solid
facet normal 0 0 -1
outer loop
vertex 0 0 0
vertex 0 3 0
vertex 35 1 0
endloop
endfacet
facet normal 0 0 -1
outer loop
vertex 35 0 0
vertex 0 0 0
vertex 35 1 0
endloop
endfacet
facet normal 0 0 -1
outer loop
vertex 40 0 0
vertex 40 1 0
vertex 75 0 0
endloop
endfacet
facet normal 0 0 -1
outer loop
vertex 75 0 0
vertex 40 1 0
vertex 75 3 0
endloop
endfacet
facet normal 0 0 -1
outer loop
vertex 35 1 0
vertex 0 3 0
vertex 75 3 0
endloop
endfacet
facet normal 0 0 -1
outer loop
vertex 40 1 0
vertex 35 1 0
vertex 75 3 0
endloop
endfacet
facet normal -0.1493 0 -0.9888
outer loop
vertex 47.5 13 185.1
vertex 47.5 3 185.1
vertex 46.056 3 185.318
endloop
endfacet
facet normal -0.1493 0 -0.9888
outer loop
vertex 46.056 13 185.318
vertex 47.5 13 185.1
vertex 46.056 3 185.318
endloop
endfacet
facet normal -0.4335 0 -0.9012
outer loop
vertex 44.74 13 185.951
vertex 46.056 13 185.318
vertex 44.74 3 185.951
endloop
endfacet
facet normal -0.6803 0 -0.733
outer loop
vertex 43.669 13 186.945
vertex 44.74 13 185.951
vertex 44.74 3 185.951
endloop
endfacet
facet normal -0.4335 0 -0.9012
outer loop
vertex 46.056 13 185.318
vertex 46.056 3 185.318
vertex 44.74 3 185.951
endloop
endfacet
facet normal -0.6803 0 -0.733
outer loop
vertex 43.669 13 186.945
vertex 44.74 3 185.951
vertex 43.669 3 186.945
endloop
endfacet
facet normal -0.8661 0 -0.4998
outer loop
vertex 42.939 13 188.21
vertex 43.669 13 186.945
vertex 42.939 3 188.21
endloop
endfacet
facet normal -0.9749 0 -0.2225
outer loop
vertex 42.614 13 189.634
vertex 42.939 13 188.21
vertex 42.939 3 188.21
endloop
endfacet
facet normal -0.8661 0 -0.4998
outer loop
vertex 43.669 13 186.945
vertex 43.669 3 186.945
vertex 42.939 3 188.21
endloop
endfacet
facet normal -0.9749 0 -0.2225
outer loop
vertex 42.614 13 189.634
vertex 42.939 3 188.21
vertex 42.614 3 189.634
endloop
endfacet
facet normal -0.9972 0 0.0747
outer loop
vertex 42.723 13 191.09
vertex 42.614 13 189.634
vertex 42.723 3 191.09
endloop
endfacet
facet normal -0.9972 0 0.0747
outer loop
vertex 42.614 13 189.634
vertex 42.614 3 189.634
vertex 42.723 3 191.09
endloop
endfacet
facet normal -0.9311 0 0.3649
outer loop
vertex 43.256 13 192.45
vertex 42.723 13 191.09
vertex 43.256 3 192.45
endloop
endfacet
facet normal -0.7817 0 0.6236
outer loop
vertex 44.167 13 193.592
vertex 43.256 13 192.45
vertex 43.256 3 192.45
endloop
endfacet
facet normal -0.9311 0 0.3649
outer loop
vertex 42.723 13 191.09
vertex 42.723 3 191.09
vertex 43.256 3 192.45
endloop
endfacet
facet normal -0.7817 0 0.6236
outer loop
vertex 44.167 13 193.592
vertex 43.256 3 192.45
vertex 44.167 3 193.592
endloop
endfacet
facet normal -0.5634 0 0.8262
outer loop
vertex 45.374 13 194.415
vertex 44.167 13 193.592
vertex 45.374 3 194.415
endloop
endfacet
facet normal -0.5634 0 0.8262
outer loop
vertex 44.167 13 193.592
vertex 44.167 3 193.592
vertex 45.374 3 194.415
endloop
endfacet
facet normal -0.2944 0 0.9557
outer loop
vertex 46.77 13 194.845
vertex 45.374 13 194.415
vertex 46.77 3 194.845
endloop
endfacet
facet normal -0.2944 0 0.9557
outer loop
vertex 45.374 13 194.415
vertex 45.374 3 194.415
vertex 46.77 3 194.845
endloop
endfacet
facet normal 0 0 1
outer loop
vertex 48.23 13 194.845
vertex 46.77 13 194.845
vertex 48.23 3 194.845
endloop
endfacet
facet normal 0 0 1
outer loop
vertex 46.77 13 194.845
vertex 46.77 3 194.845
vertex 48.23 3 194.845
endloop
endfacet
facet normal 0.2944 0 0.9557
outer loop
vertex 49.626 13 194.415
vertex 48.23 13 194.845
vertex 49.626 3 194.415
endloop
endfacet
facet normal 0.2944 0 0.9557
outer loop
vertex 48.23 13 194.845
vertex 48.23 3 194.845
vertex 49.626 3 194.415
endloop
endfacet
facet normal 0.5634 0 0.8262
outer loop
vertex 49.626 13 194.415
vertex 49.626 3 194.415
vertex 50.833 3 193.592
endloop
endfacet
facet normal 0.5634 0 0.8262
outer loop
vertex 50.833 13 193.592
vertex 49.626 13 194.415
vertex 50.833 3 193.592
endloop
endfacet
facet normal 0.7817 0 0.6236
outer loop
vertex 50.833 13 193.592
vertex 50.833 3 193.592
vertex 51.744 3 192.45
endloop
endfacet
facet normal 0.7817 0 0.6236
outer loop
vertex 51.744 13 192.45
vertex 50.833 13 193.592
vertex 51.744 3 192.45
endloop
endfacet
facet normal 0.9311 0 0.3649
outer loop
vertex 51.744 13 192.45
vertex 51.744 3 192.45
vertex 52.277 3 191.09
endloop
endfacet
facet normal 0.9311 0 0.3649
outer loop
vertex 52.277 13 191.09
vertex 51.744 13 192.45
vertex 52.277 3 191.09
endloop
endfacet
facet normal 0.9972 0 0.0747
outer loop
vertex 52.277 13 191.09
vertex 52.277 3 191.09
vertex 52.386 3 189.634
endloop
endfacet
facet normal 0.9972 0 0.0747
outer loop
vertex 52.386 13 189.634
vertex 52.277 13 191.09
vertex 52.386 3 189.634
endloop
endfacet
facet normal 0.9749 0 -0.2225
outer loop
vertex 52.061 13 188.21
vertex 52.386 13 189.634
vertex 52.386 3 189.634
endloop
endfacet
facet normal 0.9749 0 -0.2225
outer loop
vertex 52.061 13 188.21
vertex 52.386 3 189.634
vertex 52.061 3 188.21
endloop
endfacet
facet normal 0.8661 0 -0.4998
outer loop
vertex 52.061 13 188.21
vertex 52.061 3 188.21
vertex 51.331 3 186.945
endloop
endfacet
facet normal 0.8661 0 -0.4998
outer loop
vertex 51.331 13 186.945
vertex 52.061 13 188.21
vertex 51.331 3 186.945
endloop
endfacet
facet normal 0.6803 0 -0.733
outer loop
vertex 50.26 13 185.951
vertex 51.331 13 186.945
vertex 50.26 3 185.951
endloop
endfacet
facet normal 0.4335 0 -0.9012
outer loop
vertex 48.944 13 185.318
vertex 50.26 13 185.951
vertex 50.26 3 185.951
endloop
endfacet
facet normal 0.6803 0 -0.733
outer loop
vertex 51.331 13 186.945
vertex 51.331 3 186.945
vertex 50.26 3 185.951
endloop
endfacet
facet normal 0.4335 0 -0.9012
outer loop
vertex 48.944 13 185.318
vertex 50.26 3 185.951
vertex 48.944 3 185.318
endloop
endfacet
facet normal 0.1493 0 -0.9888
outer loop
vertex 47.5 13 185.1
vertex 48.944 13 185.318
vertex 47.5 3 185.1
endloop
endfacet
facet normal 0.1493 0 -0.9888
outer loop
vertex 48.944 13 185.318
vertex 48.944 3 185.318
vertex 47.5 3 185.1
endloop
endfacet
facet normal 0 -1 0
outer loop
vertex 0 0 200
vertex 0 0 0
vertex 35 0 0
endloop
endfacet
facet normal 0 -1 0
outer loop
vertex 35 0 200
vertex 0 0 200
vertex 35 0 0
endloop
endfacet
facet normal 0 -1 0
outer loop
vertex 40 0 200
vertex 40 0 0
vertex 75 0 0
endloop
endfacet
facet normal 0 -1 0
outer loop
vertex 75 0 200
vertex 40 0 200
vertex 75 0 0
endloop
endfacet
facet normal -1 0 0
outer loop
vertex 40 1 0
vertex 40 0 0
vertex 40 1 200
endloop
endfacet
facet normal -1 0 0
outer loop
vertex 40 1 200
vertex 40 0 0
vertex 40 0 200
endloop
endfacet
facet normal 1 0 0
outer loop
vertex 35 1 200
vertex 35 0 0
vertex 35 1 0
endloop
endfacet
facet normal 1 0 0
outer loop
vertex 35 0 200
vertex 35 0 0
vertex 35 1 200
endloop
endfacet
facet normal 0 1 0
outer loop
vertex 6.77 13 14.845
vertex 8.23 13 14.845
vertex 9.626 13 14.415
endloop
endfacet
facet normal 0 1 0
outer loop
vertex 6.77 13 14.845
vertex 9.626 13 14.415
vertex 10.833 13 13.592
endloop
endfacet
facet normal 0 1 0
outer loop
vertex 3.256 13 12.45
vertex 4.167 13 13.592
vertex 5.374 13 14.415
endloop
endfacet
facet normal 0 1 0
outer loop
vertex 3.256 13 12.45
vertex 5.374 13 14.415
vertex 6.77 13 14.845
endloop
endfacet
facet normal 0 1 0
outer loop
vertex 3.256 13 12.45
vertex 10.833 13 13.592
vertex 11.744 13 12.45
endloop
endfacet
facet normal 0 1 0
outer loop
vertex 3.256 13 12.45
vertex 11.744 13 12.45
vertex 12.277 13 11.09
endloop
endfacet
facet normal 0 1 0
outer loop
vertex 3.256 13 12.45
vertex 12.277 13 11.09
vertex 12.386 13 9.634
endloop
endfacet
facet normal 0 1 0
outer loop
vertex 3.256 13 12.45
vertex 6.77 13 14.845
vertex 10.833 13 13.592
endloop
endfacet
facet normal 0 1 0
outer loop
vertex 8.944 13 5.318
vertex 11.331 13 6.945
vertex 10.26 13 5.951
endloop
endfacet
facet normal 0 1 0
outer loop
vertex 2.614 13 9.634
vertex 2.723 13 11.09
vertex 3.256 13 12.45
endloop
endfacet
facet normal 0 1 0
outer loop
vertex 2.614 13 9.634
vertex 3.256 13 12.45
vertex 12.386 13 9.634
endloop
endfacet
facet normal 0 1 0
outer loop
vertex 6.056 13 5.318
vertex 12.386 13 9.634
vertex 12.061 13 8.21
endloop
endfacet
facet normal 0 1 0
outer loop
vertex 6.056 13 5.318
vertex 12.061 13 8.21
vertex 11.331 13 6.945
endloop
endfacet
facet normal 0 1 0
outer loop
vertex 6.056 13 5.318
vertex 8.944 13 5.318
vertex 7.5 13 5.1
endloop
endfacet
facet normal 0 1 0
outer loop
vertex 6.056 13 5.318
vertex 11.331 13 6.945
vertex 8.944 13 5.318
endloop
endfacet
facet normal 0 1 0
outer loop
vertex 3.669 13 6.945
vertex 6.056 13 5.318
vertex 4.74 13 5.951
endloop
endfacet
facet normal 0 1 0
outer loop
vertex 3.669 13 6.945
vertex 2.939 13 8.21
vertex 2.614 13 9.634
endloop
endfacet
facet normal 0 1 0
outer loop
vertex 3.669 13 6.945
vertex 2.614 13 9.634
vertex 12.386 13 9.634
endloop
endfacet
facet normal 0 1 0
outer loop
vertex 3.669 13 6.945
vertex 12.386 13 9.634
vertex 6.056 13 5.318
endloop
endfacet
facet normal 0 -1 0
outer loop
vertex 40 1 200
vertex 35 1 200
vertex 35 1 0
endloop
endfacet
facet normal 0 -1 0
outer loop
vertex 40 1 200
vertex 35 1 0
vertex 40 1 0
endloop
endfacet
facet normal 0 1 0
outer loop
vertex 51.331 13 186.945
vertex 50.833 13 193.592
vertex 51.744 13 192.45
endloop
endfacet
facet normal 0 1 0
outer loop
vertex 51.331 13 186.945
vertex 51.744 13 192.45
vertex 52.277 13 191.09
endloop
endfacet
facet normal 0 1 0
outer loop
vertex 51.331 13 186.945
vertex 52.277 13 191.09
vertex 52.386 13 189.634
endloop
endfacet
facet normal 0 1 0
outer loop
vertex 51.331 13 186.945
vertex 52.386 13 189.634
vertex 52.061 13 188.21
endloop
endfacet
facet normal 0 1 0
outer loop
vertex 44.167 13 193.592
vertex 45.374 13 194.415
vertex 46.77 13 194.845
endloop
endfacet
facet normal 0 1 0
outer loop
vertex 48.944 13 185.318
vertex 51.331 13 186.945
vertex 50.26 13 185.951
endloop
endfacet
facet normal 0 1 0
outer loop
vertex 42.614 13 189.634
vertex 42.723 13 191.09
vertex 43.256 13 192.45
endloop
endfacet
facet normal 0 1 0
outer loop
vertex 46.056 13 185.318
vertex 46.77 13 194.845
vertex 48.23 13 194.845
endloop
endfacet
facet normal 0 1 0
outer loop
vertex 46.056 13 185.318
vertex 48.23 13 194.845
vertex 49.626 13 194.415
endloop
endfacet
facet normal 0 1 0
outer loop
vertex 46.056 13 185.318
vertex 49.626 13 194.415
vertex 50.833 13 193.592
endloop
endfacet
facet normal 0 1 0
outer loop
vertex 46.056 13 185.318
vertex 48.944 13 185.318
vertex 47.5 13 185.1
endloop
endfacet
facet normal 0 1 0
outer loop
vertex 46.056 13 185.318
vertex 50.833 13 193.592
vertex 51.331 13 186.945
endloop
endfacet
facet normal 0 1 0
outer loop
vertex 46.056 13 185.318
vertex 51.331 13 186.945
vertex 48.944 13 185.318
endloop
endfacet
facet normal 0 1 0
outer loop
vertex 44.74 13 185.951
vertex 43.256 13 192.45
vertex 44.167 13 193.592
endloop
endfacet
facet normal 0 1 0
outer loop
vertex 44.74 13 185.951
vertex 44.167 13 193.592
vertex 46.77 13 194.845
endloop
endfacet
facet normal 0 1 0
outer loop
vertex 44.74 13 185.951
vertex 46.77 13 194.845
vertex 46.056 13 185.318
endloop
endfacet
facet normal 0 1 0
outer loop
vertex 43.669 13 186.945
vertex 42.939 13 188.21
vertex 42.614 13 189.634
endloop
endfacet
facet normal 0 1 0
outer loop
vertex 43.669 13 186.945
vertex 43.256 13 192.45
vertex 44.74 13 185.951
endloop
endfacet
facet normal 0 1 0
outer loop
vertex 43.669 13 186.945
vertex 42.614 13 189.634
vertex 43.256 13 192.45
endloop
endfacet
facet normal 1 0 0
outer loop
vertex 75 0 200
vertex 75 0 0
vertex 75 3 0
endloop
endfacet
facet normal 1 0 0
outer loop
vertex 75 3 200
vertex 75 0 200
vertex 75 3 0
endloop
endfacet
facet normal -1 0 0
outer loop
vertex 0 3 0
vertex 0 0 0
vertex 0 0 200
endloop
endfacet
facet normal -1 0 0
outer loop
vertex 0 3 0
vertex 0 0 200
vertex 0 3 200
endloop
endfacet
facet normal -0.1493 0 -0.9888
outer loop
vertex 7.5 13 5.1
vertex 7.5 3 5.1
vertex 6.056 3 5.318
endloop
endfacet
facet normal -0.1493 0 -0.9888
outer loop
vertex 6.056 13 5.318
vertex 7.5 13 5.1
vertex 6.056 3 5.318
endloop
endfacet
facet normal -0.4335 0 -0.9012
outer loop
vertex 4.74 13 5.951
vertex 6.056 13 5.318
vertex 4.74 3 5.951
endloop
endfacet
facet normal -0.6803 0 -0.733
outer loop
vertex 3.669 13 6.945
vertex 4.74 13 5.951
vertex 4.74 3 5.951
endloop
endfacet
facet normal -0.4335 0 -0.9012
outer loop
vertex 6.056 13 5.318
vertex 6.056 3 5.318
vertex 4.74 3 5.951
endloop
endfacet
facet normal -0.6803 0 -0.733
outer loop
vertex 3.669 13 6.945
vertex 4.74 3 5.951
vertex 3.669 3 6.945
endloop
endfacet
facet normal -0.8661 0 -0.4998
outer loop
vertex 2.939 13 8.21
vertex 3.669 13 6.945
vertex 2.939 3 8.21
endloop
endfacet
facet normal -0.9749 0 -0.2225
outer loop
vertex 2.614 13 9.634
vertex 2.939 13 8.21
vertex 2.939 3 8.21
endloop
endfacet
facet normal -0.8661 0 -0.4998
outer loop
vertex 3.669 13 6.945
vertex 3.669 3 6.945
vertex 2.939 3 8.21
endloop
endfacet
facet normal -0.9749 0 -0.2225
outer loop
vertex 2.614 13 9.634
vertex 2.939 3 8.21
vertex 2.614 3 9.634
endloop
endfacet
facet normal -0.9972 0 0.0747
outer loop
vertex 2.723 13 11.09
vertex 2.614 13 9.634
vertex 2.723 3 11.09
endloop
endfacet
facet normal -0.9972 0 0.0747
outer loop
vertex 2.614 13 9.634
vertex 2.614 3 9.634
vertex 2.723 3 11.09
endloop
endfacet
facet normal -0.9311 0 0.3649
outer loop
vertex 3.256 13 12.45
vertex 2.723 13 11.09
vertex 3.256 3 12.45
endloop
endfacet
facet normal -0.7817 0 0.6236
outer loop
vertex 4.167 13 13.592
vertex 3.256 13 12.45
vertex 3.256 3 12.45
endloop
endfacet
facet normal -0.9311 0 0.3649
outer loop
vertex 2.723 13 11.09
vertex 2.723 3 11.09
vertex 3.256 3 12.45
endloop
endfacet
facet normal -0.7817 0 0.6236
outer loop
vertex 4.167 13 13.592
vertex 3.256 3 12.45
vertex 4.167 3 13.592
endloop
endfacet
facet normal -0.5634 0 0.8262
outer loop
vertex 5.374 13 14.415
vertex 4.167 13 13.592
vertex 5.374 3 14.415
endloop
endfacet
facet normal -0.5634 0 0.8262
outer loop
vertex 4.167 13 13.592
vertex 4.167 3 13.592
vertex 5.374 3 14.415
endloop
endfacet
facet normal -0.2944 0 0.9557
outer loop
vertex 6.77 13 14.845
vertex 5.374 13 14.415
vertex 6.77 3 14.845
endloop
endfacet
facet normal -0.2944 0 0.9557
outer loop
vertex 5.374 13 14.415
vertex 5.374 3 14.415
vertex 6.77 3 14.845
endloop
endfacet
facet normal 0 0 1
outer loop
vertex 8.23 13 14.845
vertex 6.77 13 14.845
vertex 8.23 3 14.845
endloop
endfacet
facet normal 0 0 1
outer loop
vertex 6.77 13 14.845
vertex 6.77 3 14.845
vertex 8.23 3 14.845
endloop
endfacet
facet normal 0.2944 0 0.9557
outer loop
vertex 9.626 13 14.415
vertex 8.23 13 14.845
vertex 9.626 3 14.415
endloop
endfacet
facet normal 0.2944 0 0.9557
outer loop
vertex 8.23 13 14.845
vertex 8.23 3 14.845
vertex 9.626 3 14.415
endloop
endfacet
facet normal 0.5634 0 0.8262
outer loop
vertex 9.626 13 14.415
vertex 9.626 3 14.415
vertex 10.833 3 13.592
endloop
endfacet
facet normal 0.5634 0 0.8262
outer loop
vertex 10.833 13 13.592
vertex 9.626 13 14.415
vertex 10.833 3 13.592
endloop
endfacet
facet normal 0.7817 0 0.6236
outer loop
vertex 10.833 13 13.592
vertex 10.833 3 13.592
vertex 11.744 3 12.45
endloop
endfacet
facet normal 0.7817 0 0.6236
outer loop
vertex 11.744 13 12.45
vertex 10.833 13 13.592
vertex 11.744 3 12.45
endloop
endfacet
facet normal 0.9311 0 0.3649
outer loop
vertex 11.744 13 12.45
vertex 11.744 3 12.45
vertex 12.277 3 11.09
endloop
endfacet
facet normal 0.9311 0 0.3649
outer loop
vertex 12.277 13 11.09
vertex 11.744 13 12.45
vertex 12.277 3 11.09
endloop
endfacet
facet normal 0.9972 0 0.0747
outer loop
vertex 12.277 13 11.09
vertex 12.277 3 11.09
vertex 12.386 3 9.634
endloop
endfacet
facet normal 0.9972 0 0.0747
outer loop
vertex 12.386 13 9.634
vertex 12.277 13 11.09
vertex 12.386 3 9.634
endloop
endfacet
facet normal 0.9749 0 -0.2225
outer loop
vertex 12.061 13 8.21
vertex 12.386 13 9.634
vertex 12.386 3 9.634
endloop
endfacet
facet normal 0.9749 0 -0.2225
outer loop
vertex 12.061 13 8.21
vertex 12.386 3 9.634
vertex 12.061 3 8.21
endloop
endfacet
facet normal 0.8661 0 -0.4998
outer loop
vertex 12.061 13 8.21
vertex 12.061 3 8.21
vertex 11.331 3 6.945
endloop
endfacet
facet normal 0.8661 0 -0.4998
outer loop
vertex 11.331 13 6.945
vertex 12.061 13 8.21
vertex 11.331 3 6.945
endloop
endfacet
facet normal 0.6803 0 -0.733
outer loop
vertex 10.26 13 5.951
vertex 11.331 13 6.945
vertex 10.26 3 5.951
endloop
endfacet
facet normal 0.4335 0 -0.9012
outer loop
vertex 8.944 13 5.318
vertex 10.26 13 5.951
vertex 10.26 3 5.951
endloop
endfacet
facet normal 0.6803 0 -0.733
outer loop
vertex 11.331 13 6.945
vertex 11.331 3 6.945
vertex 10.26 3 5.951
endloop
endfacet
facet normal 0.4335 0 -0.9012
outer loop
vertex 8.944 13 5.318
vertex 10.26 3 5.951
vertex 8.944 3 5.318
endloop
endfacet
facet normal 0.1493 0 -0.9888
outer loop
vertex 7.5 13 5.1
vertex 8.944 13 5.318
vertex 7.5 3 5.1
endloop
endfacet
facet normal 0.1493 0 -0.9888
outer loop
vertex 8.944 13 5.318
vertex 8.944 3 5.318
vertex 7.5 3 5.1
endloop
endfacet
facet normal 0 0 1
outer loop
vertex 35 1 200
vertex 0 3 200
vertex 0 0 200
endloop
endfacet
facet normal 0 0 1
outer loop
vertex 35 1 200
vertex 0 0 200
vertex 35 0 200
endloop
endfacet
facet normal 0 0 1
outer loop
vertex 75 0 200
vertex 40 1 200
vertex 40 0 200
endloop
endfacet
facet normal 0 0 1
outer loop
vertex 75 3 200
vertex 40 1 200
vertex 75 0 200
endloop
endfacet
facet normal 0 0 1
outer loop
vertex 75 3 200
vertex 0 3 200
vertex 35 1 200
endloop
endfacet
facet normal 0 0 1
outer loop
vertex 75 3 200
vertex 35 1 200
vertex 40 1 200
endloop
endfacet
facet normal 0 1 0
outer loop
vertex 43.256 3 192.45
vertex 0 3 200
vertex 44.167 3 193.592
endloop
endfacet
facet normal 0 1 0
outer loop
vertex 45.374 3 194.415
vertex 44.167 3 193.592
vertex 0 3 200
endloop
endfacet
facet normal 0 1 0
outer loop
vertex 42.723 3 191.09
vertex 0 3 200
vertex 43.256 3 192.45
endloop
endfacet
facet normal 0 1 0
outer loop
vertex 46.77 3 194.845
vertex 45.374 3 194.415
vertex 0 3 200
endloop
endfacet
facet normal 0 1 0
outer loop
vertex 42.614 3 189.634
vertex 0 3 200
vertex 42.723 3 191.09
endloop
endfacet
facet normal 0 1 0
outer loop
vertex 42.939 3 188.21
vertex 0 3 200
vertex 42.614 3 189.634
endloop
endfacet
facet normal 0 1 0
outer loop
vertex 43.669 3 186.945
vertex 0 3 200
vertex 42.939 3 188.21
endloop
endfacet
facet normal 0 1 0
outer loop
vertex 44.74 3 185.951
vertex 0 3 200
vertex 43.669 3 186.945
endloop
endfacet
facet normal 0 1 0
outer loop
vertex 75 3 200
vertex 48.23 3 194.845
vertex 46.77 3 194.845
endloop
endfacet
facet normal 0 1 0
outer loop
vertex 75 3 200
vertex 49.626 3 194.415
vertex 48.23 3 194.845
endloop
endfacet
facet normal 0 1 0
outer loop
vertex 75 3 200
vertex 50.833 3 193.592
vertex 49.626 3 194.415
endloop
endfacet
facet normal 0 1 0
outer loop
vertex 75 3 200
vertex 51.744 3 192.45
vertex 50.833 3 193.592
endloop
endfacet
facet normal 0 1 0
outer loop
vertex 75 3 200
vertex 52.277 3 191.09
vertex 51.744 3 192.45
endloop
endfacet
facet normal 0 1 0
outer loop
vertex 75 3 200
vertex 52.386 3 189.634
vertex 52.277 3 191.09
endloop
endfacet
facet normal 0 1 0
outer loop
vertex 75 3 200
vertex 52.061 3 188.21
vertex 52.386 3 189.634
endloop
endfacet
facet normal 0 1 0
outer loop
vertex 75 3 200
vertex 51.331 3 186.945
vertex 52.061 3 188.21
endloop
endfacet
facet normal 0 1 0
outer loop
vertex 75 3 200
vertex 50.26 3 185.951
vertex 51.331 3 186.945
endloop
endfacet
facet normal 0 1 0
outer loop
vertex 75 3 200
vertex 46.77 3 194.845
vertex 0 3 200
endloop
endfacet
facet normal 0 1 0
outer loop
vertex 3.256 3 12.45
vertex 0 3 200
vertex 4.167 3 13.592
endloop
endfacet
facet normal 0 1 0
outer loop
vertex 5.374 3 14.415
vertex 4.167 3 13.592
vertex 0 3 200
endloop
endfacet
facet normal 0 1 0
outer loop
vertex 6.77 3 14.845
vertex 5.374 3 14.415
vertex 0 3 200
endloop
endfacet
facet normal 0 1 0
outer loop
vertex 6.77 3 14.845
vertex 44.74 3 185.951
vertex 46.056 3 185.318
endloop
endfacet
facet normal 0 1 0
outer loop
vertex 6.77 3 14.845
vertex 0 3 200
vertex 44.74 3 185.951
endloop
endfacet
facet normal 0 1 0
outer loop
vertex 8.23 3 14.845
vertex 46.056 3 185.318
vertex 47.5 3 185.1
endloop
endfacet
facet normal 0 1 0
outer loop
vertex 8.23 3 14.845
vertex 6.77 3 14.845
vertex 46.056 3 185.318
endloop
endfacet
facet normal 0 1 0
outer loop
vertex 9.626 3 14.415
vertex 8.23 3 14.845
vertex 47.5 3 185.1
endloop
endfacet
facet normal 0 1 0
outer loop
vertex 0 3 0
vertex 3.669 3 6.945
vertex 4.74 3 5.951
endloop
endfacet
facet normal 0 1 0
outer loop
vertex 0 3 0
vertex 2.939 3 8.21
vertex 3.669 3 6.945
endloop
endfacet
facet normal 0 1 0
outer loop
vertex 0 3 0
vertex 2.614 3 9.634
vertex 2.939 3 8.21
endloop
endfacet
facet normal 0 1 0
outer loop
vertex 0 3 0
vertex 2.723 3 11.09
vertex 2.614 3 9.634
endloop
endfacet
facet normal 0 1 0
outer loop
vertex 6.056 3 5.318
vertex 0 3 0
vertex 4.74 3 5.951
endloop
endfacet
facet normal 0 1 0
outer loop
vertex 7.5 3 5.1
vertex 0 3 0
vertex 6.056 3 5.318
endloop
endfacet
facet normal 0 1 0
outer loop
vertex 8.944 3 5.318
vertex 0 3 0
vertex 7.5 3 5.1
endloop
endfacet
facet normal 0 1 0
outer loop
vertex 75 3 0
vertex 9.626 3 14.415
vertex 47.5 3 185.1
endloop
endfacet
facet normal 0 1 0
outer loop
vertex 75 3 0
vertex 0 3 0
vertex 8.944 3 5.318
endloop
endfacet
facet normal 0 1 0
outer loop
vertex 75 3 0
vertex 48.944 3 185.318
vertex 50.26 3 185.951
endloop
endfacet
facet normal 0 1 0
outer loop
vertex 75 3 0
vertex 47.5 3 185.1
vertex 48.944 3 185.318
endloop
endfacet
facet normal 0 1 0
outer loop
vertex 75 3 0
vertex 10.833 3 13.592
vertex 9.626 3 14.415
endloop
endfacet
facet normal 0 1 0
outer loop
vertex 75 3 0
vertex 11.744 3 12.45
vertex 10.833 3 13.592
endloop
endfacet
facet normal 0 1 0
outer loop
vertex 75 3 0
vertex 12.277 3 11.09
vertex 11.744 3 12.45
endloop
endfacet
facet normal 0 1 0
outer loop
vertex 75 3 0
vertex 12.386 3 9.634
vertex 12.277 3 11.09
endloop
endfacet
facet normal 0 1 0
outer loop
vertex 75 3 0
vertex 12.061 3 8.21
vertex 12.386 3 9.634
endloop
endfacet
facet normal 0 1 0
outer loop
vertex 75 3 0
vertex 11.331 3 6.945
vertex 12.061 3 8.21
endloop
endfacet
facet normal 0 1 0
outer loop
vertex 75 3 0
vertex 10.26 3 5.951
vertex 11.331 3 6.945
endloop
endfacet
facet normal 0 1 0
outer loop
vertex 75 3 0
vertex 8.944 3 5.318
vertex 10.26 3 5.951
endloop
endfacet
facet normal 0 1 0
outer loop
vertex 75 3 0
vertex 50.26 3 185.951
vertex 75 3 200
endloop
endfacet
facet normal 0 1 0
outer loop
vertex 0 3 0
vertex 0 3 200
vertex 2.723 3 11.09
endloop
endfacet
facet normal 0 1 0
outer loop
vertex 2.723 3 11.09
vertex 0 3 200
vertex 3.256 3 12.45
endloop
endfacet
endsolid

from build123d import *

# Parameters (mm, degrees)
SKETCH1_W           = 75
SKETCH1_H           = 3
BOSS_EXTRUDE1_DEPTH = 200
SKETCH2_R           = 4.9
BOSS_EXTRUDE2_DEPTH = 10
SKETCH3_W           = 5
SKETCH3_H           = 200
CUT_EXTRUDE1_DEPTH  = 1


with BuildPart() as part:
    # Sketch1 → Boss-Extrude1 (new body)
    with BuildSketch(Plane.XY):
        with Locations((37.5, 1.5)):
            Rectangle(SKETCH1_W, SKETCH1_H)
    extrude(amount=BOSS_EXTRUDE1_DEPTH)

    # Sketch2 → Boss-Extrude2 (add)
    with BuildSketch(Plane(origin=(0, 3, 0), x_dir=(1, 0, 0), z_dir=(0, 1, 0))):
        with Locations(Location((7.5, -10, 0), (0, 0, 90))):
            Circle(SKETCH2_R)
        with Locations(Location((47.5, -190, 0), (0, 0, 90))):
            Circle(SKETCH2_R)
    extrude(amount=BOSS_EXTRUDE2_DEPTH)

    # Sketch3 → Cut-Extrude1 (cut)
    with BuildSketch(Plane.XZ):
        with Locations((37.5, 100)):
            Rectangle(SKETCH3_W, SKETCH3_H)
    extrude(amount=-CUT_EXTRUDE1_DEPTH, mode=Mode.SUBTRACT)


solid = part.part
